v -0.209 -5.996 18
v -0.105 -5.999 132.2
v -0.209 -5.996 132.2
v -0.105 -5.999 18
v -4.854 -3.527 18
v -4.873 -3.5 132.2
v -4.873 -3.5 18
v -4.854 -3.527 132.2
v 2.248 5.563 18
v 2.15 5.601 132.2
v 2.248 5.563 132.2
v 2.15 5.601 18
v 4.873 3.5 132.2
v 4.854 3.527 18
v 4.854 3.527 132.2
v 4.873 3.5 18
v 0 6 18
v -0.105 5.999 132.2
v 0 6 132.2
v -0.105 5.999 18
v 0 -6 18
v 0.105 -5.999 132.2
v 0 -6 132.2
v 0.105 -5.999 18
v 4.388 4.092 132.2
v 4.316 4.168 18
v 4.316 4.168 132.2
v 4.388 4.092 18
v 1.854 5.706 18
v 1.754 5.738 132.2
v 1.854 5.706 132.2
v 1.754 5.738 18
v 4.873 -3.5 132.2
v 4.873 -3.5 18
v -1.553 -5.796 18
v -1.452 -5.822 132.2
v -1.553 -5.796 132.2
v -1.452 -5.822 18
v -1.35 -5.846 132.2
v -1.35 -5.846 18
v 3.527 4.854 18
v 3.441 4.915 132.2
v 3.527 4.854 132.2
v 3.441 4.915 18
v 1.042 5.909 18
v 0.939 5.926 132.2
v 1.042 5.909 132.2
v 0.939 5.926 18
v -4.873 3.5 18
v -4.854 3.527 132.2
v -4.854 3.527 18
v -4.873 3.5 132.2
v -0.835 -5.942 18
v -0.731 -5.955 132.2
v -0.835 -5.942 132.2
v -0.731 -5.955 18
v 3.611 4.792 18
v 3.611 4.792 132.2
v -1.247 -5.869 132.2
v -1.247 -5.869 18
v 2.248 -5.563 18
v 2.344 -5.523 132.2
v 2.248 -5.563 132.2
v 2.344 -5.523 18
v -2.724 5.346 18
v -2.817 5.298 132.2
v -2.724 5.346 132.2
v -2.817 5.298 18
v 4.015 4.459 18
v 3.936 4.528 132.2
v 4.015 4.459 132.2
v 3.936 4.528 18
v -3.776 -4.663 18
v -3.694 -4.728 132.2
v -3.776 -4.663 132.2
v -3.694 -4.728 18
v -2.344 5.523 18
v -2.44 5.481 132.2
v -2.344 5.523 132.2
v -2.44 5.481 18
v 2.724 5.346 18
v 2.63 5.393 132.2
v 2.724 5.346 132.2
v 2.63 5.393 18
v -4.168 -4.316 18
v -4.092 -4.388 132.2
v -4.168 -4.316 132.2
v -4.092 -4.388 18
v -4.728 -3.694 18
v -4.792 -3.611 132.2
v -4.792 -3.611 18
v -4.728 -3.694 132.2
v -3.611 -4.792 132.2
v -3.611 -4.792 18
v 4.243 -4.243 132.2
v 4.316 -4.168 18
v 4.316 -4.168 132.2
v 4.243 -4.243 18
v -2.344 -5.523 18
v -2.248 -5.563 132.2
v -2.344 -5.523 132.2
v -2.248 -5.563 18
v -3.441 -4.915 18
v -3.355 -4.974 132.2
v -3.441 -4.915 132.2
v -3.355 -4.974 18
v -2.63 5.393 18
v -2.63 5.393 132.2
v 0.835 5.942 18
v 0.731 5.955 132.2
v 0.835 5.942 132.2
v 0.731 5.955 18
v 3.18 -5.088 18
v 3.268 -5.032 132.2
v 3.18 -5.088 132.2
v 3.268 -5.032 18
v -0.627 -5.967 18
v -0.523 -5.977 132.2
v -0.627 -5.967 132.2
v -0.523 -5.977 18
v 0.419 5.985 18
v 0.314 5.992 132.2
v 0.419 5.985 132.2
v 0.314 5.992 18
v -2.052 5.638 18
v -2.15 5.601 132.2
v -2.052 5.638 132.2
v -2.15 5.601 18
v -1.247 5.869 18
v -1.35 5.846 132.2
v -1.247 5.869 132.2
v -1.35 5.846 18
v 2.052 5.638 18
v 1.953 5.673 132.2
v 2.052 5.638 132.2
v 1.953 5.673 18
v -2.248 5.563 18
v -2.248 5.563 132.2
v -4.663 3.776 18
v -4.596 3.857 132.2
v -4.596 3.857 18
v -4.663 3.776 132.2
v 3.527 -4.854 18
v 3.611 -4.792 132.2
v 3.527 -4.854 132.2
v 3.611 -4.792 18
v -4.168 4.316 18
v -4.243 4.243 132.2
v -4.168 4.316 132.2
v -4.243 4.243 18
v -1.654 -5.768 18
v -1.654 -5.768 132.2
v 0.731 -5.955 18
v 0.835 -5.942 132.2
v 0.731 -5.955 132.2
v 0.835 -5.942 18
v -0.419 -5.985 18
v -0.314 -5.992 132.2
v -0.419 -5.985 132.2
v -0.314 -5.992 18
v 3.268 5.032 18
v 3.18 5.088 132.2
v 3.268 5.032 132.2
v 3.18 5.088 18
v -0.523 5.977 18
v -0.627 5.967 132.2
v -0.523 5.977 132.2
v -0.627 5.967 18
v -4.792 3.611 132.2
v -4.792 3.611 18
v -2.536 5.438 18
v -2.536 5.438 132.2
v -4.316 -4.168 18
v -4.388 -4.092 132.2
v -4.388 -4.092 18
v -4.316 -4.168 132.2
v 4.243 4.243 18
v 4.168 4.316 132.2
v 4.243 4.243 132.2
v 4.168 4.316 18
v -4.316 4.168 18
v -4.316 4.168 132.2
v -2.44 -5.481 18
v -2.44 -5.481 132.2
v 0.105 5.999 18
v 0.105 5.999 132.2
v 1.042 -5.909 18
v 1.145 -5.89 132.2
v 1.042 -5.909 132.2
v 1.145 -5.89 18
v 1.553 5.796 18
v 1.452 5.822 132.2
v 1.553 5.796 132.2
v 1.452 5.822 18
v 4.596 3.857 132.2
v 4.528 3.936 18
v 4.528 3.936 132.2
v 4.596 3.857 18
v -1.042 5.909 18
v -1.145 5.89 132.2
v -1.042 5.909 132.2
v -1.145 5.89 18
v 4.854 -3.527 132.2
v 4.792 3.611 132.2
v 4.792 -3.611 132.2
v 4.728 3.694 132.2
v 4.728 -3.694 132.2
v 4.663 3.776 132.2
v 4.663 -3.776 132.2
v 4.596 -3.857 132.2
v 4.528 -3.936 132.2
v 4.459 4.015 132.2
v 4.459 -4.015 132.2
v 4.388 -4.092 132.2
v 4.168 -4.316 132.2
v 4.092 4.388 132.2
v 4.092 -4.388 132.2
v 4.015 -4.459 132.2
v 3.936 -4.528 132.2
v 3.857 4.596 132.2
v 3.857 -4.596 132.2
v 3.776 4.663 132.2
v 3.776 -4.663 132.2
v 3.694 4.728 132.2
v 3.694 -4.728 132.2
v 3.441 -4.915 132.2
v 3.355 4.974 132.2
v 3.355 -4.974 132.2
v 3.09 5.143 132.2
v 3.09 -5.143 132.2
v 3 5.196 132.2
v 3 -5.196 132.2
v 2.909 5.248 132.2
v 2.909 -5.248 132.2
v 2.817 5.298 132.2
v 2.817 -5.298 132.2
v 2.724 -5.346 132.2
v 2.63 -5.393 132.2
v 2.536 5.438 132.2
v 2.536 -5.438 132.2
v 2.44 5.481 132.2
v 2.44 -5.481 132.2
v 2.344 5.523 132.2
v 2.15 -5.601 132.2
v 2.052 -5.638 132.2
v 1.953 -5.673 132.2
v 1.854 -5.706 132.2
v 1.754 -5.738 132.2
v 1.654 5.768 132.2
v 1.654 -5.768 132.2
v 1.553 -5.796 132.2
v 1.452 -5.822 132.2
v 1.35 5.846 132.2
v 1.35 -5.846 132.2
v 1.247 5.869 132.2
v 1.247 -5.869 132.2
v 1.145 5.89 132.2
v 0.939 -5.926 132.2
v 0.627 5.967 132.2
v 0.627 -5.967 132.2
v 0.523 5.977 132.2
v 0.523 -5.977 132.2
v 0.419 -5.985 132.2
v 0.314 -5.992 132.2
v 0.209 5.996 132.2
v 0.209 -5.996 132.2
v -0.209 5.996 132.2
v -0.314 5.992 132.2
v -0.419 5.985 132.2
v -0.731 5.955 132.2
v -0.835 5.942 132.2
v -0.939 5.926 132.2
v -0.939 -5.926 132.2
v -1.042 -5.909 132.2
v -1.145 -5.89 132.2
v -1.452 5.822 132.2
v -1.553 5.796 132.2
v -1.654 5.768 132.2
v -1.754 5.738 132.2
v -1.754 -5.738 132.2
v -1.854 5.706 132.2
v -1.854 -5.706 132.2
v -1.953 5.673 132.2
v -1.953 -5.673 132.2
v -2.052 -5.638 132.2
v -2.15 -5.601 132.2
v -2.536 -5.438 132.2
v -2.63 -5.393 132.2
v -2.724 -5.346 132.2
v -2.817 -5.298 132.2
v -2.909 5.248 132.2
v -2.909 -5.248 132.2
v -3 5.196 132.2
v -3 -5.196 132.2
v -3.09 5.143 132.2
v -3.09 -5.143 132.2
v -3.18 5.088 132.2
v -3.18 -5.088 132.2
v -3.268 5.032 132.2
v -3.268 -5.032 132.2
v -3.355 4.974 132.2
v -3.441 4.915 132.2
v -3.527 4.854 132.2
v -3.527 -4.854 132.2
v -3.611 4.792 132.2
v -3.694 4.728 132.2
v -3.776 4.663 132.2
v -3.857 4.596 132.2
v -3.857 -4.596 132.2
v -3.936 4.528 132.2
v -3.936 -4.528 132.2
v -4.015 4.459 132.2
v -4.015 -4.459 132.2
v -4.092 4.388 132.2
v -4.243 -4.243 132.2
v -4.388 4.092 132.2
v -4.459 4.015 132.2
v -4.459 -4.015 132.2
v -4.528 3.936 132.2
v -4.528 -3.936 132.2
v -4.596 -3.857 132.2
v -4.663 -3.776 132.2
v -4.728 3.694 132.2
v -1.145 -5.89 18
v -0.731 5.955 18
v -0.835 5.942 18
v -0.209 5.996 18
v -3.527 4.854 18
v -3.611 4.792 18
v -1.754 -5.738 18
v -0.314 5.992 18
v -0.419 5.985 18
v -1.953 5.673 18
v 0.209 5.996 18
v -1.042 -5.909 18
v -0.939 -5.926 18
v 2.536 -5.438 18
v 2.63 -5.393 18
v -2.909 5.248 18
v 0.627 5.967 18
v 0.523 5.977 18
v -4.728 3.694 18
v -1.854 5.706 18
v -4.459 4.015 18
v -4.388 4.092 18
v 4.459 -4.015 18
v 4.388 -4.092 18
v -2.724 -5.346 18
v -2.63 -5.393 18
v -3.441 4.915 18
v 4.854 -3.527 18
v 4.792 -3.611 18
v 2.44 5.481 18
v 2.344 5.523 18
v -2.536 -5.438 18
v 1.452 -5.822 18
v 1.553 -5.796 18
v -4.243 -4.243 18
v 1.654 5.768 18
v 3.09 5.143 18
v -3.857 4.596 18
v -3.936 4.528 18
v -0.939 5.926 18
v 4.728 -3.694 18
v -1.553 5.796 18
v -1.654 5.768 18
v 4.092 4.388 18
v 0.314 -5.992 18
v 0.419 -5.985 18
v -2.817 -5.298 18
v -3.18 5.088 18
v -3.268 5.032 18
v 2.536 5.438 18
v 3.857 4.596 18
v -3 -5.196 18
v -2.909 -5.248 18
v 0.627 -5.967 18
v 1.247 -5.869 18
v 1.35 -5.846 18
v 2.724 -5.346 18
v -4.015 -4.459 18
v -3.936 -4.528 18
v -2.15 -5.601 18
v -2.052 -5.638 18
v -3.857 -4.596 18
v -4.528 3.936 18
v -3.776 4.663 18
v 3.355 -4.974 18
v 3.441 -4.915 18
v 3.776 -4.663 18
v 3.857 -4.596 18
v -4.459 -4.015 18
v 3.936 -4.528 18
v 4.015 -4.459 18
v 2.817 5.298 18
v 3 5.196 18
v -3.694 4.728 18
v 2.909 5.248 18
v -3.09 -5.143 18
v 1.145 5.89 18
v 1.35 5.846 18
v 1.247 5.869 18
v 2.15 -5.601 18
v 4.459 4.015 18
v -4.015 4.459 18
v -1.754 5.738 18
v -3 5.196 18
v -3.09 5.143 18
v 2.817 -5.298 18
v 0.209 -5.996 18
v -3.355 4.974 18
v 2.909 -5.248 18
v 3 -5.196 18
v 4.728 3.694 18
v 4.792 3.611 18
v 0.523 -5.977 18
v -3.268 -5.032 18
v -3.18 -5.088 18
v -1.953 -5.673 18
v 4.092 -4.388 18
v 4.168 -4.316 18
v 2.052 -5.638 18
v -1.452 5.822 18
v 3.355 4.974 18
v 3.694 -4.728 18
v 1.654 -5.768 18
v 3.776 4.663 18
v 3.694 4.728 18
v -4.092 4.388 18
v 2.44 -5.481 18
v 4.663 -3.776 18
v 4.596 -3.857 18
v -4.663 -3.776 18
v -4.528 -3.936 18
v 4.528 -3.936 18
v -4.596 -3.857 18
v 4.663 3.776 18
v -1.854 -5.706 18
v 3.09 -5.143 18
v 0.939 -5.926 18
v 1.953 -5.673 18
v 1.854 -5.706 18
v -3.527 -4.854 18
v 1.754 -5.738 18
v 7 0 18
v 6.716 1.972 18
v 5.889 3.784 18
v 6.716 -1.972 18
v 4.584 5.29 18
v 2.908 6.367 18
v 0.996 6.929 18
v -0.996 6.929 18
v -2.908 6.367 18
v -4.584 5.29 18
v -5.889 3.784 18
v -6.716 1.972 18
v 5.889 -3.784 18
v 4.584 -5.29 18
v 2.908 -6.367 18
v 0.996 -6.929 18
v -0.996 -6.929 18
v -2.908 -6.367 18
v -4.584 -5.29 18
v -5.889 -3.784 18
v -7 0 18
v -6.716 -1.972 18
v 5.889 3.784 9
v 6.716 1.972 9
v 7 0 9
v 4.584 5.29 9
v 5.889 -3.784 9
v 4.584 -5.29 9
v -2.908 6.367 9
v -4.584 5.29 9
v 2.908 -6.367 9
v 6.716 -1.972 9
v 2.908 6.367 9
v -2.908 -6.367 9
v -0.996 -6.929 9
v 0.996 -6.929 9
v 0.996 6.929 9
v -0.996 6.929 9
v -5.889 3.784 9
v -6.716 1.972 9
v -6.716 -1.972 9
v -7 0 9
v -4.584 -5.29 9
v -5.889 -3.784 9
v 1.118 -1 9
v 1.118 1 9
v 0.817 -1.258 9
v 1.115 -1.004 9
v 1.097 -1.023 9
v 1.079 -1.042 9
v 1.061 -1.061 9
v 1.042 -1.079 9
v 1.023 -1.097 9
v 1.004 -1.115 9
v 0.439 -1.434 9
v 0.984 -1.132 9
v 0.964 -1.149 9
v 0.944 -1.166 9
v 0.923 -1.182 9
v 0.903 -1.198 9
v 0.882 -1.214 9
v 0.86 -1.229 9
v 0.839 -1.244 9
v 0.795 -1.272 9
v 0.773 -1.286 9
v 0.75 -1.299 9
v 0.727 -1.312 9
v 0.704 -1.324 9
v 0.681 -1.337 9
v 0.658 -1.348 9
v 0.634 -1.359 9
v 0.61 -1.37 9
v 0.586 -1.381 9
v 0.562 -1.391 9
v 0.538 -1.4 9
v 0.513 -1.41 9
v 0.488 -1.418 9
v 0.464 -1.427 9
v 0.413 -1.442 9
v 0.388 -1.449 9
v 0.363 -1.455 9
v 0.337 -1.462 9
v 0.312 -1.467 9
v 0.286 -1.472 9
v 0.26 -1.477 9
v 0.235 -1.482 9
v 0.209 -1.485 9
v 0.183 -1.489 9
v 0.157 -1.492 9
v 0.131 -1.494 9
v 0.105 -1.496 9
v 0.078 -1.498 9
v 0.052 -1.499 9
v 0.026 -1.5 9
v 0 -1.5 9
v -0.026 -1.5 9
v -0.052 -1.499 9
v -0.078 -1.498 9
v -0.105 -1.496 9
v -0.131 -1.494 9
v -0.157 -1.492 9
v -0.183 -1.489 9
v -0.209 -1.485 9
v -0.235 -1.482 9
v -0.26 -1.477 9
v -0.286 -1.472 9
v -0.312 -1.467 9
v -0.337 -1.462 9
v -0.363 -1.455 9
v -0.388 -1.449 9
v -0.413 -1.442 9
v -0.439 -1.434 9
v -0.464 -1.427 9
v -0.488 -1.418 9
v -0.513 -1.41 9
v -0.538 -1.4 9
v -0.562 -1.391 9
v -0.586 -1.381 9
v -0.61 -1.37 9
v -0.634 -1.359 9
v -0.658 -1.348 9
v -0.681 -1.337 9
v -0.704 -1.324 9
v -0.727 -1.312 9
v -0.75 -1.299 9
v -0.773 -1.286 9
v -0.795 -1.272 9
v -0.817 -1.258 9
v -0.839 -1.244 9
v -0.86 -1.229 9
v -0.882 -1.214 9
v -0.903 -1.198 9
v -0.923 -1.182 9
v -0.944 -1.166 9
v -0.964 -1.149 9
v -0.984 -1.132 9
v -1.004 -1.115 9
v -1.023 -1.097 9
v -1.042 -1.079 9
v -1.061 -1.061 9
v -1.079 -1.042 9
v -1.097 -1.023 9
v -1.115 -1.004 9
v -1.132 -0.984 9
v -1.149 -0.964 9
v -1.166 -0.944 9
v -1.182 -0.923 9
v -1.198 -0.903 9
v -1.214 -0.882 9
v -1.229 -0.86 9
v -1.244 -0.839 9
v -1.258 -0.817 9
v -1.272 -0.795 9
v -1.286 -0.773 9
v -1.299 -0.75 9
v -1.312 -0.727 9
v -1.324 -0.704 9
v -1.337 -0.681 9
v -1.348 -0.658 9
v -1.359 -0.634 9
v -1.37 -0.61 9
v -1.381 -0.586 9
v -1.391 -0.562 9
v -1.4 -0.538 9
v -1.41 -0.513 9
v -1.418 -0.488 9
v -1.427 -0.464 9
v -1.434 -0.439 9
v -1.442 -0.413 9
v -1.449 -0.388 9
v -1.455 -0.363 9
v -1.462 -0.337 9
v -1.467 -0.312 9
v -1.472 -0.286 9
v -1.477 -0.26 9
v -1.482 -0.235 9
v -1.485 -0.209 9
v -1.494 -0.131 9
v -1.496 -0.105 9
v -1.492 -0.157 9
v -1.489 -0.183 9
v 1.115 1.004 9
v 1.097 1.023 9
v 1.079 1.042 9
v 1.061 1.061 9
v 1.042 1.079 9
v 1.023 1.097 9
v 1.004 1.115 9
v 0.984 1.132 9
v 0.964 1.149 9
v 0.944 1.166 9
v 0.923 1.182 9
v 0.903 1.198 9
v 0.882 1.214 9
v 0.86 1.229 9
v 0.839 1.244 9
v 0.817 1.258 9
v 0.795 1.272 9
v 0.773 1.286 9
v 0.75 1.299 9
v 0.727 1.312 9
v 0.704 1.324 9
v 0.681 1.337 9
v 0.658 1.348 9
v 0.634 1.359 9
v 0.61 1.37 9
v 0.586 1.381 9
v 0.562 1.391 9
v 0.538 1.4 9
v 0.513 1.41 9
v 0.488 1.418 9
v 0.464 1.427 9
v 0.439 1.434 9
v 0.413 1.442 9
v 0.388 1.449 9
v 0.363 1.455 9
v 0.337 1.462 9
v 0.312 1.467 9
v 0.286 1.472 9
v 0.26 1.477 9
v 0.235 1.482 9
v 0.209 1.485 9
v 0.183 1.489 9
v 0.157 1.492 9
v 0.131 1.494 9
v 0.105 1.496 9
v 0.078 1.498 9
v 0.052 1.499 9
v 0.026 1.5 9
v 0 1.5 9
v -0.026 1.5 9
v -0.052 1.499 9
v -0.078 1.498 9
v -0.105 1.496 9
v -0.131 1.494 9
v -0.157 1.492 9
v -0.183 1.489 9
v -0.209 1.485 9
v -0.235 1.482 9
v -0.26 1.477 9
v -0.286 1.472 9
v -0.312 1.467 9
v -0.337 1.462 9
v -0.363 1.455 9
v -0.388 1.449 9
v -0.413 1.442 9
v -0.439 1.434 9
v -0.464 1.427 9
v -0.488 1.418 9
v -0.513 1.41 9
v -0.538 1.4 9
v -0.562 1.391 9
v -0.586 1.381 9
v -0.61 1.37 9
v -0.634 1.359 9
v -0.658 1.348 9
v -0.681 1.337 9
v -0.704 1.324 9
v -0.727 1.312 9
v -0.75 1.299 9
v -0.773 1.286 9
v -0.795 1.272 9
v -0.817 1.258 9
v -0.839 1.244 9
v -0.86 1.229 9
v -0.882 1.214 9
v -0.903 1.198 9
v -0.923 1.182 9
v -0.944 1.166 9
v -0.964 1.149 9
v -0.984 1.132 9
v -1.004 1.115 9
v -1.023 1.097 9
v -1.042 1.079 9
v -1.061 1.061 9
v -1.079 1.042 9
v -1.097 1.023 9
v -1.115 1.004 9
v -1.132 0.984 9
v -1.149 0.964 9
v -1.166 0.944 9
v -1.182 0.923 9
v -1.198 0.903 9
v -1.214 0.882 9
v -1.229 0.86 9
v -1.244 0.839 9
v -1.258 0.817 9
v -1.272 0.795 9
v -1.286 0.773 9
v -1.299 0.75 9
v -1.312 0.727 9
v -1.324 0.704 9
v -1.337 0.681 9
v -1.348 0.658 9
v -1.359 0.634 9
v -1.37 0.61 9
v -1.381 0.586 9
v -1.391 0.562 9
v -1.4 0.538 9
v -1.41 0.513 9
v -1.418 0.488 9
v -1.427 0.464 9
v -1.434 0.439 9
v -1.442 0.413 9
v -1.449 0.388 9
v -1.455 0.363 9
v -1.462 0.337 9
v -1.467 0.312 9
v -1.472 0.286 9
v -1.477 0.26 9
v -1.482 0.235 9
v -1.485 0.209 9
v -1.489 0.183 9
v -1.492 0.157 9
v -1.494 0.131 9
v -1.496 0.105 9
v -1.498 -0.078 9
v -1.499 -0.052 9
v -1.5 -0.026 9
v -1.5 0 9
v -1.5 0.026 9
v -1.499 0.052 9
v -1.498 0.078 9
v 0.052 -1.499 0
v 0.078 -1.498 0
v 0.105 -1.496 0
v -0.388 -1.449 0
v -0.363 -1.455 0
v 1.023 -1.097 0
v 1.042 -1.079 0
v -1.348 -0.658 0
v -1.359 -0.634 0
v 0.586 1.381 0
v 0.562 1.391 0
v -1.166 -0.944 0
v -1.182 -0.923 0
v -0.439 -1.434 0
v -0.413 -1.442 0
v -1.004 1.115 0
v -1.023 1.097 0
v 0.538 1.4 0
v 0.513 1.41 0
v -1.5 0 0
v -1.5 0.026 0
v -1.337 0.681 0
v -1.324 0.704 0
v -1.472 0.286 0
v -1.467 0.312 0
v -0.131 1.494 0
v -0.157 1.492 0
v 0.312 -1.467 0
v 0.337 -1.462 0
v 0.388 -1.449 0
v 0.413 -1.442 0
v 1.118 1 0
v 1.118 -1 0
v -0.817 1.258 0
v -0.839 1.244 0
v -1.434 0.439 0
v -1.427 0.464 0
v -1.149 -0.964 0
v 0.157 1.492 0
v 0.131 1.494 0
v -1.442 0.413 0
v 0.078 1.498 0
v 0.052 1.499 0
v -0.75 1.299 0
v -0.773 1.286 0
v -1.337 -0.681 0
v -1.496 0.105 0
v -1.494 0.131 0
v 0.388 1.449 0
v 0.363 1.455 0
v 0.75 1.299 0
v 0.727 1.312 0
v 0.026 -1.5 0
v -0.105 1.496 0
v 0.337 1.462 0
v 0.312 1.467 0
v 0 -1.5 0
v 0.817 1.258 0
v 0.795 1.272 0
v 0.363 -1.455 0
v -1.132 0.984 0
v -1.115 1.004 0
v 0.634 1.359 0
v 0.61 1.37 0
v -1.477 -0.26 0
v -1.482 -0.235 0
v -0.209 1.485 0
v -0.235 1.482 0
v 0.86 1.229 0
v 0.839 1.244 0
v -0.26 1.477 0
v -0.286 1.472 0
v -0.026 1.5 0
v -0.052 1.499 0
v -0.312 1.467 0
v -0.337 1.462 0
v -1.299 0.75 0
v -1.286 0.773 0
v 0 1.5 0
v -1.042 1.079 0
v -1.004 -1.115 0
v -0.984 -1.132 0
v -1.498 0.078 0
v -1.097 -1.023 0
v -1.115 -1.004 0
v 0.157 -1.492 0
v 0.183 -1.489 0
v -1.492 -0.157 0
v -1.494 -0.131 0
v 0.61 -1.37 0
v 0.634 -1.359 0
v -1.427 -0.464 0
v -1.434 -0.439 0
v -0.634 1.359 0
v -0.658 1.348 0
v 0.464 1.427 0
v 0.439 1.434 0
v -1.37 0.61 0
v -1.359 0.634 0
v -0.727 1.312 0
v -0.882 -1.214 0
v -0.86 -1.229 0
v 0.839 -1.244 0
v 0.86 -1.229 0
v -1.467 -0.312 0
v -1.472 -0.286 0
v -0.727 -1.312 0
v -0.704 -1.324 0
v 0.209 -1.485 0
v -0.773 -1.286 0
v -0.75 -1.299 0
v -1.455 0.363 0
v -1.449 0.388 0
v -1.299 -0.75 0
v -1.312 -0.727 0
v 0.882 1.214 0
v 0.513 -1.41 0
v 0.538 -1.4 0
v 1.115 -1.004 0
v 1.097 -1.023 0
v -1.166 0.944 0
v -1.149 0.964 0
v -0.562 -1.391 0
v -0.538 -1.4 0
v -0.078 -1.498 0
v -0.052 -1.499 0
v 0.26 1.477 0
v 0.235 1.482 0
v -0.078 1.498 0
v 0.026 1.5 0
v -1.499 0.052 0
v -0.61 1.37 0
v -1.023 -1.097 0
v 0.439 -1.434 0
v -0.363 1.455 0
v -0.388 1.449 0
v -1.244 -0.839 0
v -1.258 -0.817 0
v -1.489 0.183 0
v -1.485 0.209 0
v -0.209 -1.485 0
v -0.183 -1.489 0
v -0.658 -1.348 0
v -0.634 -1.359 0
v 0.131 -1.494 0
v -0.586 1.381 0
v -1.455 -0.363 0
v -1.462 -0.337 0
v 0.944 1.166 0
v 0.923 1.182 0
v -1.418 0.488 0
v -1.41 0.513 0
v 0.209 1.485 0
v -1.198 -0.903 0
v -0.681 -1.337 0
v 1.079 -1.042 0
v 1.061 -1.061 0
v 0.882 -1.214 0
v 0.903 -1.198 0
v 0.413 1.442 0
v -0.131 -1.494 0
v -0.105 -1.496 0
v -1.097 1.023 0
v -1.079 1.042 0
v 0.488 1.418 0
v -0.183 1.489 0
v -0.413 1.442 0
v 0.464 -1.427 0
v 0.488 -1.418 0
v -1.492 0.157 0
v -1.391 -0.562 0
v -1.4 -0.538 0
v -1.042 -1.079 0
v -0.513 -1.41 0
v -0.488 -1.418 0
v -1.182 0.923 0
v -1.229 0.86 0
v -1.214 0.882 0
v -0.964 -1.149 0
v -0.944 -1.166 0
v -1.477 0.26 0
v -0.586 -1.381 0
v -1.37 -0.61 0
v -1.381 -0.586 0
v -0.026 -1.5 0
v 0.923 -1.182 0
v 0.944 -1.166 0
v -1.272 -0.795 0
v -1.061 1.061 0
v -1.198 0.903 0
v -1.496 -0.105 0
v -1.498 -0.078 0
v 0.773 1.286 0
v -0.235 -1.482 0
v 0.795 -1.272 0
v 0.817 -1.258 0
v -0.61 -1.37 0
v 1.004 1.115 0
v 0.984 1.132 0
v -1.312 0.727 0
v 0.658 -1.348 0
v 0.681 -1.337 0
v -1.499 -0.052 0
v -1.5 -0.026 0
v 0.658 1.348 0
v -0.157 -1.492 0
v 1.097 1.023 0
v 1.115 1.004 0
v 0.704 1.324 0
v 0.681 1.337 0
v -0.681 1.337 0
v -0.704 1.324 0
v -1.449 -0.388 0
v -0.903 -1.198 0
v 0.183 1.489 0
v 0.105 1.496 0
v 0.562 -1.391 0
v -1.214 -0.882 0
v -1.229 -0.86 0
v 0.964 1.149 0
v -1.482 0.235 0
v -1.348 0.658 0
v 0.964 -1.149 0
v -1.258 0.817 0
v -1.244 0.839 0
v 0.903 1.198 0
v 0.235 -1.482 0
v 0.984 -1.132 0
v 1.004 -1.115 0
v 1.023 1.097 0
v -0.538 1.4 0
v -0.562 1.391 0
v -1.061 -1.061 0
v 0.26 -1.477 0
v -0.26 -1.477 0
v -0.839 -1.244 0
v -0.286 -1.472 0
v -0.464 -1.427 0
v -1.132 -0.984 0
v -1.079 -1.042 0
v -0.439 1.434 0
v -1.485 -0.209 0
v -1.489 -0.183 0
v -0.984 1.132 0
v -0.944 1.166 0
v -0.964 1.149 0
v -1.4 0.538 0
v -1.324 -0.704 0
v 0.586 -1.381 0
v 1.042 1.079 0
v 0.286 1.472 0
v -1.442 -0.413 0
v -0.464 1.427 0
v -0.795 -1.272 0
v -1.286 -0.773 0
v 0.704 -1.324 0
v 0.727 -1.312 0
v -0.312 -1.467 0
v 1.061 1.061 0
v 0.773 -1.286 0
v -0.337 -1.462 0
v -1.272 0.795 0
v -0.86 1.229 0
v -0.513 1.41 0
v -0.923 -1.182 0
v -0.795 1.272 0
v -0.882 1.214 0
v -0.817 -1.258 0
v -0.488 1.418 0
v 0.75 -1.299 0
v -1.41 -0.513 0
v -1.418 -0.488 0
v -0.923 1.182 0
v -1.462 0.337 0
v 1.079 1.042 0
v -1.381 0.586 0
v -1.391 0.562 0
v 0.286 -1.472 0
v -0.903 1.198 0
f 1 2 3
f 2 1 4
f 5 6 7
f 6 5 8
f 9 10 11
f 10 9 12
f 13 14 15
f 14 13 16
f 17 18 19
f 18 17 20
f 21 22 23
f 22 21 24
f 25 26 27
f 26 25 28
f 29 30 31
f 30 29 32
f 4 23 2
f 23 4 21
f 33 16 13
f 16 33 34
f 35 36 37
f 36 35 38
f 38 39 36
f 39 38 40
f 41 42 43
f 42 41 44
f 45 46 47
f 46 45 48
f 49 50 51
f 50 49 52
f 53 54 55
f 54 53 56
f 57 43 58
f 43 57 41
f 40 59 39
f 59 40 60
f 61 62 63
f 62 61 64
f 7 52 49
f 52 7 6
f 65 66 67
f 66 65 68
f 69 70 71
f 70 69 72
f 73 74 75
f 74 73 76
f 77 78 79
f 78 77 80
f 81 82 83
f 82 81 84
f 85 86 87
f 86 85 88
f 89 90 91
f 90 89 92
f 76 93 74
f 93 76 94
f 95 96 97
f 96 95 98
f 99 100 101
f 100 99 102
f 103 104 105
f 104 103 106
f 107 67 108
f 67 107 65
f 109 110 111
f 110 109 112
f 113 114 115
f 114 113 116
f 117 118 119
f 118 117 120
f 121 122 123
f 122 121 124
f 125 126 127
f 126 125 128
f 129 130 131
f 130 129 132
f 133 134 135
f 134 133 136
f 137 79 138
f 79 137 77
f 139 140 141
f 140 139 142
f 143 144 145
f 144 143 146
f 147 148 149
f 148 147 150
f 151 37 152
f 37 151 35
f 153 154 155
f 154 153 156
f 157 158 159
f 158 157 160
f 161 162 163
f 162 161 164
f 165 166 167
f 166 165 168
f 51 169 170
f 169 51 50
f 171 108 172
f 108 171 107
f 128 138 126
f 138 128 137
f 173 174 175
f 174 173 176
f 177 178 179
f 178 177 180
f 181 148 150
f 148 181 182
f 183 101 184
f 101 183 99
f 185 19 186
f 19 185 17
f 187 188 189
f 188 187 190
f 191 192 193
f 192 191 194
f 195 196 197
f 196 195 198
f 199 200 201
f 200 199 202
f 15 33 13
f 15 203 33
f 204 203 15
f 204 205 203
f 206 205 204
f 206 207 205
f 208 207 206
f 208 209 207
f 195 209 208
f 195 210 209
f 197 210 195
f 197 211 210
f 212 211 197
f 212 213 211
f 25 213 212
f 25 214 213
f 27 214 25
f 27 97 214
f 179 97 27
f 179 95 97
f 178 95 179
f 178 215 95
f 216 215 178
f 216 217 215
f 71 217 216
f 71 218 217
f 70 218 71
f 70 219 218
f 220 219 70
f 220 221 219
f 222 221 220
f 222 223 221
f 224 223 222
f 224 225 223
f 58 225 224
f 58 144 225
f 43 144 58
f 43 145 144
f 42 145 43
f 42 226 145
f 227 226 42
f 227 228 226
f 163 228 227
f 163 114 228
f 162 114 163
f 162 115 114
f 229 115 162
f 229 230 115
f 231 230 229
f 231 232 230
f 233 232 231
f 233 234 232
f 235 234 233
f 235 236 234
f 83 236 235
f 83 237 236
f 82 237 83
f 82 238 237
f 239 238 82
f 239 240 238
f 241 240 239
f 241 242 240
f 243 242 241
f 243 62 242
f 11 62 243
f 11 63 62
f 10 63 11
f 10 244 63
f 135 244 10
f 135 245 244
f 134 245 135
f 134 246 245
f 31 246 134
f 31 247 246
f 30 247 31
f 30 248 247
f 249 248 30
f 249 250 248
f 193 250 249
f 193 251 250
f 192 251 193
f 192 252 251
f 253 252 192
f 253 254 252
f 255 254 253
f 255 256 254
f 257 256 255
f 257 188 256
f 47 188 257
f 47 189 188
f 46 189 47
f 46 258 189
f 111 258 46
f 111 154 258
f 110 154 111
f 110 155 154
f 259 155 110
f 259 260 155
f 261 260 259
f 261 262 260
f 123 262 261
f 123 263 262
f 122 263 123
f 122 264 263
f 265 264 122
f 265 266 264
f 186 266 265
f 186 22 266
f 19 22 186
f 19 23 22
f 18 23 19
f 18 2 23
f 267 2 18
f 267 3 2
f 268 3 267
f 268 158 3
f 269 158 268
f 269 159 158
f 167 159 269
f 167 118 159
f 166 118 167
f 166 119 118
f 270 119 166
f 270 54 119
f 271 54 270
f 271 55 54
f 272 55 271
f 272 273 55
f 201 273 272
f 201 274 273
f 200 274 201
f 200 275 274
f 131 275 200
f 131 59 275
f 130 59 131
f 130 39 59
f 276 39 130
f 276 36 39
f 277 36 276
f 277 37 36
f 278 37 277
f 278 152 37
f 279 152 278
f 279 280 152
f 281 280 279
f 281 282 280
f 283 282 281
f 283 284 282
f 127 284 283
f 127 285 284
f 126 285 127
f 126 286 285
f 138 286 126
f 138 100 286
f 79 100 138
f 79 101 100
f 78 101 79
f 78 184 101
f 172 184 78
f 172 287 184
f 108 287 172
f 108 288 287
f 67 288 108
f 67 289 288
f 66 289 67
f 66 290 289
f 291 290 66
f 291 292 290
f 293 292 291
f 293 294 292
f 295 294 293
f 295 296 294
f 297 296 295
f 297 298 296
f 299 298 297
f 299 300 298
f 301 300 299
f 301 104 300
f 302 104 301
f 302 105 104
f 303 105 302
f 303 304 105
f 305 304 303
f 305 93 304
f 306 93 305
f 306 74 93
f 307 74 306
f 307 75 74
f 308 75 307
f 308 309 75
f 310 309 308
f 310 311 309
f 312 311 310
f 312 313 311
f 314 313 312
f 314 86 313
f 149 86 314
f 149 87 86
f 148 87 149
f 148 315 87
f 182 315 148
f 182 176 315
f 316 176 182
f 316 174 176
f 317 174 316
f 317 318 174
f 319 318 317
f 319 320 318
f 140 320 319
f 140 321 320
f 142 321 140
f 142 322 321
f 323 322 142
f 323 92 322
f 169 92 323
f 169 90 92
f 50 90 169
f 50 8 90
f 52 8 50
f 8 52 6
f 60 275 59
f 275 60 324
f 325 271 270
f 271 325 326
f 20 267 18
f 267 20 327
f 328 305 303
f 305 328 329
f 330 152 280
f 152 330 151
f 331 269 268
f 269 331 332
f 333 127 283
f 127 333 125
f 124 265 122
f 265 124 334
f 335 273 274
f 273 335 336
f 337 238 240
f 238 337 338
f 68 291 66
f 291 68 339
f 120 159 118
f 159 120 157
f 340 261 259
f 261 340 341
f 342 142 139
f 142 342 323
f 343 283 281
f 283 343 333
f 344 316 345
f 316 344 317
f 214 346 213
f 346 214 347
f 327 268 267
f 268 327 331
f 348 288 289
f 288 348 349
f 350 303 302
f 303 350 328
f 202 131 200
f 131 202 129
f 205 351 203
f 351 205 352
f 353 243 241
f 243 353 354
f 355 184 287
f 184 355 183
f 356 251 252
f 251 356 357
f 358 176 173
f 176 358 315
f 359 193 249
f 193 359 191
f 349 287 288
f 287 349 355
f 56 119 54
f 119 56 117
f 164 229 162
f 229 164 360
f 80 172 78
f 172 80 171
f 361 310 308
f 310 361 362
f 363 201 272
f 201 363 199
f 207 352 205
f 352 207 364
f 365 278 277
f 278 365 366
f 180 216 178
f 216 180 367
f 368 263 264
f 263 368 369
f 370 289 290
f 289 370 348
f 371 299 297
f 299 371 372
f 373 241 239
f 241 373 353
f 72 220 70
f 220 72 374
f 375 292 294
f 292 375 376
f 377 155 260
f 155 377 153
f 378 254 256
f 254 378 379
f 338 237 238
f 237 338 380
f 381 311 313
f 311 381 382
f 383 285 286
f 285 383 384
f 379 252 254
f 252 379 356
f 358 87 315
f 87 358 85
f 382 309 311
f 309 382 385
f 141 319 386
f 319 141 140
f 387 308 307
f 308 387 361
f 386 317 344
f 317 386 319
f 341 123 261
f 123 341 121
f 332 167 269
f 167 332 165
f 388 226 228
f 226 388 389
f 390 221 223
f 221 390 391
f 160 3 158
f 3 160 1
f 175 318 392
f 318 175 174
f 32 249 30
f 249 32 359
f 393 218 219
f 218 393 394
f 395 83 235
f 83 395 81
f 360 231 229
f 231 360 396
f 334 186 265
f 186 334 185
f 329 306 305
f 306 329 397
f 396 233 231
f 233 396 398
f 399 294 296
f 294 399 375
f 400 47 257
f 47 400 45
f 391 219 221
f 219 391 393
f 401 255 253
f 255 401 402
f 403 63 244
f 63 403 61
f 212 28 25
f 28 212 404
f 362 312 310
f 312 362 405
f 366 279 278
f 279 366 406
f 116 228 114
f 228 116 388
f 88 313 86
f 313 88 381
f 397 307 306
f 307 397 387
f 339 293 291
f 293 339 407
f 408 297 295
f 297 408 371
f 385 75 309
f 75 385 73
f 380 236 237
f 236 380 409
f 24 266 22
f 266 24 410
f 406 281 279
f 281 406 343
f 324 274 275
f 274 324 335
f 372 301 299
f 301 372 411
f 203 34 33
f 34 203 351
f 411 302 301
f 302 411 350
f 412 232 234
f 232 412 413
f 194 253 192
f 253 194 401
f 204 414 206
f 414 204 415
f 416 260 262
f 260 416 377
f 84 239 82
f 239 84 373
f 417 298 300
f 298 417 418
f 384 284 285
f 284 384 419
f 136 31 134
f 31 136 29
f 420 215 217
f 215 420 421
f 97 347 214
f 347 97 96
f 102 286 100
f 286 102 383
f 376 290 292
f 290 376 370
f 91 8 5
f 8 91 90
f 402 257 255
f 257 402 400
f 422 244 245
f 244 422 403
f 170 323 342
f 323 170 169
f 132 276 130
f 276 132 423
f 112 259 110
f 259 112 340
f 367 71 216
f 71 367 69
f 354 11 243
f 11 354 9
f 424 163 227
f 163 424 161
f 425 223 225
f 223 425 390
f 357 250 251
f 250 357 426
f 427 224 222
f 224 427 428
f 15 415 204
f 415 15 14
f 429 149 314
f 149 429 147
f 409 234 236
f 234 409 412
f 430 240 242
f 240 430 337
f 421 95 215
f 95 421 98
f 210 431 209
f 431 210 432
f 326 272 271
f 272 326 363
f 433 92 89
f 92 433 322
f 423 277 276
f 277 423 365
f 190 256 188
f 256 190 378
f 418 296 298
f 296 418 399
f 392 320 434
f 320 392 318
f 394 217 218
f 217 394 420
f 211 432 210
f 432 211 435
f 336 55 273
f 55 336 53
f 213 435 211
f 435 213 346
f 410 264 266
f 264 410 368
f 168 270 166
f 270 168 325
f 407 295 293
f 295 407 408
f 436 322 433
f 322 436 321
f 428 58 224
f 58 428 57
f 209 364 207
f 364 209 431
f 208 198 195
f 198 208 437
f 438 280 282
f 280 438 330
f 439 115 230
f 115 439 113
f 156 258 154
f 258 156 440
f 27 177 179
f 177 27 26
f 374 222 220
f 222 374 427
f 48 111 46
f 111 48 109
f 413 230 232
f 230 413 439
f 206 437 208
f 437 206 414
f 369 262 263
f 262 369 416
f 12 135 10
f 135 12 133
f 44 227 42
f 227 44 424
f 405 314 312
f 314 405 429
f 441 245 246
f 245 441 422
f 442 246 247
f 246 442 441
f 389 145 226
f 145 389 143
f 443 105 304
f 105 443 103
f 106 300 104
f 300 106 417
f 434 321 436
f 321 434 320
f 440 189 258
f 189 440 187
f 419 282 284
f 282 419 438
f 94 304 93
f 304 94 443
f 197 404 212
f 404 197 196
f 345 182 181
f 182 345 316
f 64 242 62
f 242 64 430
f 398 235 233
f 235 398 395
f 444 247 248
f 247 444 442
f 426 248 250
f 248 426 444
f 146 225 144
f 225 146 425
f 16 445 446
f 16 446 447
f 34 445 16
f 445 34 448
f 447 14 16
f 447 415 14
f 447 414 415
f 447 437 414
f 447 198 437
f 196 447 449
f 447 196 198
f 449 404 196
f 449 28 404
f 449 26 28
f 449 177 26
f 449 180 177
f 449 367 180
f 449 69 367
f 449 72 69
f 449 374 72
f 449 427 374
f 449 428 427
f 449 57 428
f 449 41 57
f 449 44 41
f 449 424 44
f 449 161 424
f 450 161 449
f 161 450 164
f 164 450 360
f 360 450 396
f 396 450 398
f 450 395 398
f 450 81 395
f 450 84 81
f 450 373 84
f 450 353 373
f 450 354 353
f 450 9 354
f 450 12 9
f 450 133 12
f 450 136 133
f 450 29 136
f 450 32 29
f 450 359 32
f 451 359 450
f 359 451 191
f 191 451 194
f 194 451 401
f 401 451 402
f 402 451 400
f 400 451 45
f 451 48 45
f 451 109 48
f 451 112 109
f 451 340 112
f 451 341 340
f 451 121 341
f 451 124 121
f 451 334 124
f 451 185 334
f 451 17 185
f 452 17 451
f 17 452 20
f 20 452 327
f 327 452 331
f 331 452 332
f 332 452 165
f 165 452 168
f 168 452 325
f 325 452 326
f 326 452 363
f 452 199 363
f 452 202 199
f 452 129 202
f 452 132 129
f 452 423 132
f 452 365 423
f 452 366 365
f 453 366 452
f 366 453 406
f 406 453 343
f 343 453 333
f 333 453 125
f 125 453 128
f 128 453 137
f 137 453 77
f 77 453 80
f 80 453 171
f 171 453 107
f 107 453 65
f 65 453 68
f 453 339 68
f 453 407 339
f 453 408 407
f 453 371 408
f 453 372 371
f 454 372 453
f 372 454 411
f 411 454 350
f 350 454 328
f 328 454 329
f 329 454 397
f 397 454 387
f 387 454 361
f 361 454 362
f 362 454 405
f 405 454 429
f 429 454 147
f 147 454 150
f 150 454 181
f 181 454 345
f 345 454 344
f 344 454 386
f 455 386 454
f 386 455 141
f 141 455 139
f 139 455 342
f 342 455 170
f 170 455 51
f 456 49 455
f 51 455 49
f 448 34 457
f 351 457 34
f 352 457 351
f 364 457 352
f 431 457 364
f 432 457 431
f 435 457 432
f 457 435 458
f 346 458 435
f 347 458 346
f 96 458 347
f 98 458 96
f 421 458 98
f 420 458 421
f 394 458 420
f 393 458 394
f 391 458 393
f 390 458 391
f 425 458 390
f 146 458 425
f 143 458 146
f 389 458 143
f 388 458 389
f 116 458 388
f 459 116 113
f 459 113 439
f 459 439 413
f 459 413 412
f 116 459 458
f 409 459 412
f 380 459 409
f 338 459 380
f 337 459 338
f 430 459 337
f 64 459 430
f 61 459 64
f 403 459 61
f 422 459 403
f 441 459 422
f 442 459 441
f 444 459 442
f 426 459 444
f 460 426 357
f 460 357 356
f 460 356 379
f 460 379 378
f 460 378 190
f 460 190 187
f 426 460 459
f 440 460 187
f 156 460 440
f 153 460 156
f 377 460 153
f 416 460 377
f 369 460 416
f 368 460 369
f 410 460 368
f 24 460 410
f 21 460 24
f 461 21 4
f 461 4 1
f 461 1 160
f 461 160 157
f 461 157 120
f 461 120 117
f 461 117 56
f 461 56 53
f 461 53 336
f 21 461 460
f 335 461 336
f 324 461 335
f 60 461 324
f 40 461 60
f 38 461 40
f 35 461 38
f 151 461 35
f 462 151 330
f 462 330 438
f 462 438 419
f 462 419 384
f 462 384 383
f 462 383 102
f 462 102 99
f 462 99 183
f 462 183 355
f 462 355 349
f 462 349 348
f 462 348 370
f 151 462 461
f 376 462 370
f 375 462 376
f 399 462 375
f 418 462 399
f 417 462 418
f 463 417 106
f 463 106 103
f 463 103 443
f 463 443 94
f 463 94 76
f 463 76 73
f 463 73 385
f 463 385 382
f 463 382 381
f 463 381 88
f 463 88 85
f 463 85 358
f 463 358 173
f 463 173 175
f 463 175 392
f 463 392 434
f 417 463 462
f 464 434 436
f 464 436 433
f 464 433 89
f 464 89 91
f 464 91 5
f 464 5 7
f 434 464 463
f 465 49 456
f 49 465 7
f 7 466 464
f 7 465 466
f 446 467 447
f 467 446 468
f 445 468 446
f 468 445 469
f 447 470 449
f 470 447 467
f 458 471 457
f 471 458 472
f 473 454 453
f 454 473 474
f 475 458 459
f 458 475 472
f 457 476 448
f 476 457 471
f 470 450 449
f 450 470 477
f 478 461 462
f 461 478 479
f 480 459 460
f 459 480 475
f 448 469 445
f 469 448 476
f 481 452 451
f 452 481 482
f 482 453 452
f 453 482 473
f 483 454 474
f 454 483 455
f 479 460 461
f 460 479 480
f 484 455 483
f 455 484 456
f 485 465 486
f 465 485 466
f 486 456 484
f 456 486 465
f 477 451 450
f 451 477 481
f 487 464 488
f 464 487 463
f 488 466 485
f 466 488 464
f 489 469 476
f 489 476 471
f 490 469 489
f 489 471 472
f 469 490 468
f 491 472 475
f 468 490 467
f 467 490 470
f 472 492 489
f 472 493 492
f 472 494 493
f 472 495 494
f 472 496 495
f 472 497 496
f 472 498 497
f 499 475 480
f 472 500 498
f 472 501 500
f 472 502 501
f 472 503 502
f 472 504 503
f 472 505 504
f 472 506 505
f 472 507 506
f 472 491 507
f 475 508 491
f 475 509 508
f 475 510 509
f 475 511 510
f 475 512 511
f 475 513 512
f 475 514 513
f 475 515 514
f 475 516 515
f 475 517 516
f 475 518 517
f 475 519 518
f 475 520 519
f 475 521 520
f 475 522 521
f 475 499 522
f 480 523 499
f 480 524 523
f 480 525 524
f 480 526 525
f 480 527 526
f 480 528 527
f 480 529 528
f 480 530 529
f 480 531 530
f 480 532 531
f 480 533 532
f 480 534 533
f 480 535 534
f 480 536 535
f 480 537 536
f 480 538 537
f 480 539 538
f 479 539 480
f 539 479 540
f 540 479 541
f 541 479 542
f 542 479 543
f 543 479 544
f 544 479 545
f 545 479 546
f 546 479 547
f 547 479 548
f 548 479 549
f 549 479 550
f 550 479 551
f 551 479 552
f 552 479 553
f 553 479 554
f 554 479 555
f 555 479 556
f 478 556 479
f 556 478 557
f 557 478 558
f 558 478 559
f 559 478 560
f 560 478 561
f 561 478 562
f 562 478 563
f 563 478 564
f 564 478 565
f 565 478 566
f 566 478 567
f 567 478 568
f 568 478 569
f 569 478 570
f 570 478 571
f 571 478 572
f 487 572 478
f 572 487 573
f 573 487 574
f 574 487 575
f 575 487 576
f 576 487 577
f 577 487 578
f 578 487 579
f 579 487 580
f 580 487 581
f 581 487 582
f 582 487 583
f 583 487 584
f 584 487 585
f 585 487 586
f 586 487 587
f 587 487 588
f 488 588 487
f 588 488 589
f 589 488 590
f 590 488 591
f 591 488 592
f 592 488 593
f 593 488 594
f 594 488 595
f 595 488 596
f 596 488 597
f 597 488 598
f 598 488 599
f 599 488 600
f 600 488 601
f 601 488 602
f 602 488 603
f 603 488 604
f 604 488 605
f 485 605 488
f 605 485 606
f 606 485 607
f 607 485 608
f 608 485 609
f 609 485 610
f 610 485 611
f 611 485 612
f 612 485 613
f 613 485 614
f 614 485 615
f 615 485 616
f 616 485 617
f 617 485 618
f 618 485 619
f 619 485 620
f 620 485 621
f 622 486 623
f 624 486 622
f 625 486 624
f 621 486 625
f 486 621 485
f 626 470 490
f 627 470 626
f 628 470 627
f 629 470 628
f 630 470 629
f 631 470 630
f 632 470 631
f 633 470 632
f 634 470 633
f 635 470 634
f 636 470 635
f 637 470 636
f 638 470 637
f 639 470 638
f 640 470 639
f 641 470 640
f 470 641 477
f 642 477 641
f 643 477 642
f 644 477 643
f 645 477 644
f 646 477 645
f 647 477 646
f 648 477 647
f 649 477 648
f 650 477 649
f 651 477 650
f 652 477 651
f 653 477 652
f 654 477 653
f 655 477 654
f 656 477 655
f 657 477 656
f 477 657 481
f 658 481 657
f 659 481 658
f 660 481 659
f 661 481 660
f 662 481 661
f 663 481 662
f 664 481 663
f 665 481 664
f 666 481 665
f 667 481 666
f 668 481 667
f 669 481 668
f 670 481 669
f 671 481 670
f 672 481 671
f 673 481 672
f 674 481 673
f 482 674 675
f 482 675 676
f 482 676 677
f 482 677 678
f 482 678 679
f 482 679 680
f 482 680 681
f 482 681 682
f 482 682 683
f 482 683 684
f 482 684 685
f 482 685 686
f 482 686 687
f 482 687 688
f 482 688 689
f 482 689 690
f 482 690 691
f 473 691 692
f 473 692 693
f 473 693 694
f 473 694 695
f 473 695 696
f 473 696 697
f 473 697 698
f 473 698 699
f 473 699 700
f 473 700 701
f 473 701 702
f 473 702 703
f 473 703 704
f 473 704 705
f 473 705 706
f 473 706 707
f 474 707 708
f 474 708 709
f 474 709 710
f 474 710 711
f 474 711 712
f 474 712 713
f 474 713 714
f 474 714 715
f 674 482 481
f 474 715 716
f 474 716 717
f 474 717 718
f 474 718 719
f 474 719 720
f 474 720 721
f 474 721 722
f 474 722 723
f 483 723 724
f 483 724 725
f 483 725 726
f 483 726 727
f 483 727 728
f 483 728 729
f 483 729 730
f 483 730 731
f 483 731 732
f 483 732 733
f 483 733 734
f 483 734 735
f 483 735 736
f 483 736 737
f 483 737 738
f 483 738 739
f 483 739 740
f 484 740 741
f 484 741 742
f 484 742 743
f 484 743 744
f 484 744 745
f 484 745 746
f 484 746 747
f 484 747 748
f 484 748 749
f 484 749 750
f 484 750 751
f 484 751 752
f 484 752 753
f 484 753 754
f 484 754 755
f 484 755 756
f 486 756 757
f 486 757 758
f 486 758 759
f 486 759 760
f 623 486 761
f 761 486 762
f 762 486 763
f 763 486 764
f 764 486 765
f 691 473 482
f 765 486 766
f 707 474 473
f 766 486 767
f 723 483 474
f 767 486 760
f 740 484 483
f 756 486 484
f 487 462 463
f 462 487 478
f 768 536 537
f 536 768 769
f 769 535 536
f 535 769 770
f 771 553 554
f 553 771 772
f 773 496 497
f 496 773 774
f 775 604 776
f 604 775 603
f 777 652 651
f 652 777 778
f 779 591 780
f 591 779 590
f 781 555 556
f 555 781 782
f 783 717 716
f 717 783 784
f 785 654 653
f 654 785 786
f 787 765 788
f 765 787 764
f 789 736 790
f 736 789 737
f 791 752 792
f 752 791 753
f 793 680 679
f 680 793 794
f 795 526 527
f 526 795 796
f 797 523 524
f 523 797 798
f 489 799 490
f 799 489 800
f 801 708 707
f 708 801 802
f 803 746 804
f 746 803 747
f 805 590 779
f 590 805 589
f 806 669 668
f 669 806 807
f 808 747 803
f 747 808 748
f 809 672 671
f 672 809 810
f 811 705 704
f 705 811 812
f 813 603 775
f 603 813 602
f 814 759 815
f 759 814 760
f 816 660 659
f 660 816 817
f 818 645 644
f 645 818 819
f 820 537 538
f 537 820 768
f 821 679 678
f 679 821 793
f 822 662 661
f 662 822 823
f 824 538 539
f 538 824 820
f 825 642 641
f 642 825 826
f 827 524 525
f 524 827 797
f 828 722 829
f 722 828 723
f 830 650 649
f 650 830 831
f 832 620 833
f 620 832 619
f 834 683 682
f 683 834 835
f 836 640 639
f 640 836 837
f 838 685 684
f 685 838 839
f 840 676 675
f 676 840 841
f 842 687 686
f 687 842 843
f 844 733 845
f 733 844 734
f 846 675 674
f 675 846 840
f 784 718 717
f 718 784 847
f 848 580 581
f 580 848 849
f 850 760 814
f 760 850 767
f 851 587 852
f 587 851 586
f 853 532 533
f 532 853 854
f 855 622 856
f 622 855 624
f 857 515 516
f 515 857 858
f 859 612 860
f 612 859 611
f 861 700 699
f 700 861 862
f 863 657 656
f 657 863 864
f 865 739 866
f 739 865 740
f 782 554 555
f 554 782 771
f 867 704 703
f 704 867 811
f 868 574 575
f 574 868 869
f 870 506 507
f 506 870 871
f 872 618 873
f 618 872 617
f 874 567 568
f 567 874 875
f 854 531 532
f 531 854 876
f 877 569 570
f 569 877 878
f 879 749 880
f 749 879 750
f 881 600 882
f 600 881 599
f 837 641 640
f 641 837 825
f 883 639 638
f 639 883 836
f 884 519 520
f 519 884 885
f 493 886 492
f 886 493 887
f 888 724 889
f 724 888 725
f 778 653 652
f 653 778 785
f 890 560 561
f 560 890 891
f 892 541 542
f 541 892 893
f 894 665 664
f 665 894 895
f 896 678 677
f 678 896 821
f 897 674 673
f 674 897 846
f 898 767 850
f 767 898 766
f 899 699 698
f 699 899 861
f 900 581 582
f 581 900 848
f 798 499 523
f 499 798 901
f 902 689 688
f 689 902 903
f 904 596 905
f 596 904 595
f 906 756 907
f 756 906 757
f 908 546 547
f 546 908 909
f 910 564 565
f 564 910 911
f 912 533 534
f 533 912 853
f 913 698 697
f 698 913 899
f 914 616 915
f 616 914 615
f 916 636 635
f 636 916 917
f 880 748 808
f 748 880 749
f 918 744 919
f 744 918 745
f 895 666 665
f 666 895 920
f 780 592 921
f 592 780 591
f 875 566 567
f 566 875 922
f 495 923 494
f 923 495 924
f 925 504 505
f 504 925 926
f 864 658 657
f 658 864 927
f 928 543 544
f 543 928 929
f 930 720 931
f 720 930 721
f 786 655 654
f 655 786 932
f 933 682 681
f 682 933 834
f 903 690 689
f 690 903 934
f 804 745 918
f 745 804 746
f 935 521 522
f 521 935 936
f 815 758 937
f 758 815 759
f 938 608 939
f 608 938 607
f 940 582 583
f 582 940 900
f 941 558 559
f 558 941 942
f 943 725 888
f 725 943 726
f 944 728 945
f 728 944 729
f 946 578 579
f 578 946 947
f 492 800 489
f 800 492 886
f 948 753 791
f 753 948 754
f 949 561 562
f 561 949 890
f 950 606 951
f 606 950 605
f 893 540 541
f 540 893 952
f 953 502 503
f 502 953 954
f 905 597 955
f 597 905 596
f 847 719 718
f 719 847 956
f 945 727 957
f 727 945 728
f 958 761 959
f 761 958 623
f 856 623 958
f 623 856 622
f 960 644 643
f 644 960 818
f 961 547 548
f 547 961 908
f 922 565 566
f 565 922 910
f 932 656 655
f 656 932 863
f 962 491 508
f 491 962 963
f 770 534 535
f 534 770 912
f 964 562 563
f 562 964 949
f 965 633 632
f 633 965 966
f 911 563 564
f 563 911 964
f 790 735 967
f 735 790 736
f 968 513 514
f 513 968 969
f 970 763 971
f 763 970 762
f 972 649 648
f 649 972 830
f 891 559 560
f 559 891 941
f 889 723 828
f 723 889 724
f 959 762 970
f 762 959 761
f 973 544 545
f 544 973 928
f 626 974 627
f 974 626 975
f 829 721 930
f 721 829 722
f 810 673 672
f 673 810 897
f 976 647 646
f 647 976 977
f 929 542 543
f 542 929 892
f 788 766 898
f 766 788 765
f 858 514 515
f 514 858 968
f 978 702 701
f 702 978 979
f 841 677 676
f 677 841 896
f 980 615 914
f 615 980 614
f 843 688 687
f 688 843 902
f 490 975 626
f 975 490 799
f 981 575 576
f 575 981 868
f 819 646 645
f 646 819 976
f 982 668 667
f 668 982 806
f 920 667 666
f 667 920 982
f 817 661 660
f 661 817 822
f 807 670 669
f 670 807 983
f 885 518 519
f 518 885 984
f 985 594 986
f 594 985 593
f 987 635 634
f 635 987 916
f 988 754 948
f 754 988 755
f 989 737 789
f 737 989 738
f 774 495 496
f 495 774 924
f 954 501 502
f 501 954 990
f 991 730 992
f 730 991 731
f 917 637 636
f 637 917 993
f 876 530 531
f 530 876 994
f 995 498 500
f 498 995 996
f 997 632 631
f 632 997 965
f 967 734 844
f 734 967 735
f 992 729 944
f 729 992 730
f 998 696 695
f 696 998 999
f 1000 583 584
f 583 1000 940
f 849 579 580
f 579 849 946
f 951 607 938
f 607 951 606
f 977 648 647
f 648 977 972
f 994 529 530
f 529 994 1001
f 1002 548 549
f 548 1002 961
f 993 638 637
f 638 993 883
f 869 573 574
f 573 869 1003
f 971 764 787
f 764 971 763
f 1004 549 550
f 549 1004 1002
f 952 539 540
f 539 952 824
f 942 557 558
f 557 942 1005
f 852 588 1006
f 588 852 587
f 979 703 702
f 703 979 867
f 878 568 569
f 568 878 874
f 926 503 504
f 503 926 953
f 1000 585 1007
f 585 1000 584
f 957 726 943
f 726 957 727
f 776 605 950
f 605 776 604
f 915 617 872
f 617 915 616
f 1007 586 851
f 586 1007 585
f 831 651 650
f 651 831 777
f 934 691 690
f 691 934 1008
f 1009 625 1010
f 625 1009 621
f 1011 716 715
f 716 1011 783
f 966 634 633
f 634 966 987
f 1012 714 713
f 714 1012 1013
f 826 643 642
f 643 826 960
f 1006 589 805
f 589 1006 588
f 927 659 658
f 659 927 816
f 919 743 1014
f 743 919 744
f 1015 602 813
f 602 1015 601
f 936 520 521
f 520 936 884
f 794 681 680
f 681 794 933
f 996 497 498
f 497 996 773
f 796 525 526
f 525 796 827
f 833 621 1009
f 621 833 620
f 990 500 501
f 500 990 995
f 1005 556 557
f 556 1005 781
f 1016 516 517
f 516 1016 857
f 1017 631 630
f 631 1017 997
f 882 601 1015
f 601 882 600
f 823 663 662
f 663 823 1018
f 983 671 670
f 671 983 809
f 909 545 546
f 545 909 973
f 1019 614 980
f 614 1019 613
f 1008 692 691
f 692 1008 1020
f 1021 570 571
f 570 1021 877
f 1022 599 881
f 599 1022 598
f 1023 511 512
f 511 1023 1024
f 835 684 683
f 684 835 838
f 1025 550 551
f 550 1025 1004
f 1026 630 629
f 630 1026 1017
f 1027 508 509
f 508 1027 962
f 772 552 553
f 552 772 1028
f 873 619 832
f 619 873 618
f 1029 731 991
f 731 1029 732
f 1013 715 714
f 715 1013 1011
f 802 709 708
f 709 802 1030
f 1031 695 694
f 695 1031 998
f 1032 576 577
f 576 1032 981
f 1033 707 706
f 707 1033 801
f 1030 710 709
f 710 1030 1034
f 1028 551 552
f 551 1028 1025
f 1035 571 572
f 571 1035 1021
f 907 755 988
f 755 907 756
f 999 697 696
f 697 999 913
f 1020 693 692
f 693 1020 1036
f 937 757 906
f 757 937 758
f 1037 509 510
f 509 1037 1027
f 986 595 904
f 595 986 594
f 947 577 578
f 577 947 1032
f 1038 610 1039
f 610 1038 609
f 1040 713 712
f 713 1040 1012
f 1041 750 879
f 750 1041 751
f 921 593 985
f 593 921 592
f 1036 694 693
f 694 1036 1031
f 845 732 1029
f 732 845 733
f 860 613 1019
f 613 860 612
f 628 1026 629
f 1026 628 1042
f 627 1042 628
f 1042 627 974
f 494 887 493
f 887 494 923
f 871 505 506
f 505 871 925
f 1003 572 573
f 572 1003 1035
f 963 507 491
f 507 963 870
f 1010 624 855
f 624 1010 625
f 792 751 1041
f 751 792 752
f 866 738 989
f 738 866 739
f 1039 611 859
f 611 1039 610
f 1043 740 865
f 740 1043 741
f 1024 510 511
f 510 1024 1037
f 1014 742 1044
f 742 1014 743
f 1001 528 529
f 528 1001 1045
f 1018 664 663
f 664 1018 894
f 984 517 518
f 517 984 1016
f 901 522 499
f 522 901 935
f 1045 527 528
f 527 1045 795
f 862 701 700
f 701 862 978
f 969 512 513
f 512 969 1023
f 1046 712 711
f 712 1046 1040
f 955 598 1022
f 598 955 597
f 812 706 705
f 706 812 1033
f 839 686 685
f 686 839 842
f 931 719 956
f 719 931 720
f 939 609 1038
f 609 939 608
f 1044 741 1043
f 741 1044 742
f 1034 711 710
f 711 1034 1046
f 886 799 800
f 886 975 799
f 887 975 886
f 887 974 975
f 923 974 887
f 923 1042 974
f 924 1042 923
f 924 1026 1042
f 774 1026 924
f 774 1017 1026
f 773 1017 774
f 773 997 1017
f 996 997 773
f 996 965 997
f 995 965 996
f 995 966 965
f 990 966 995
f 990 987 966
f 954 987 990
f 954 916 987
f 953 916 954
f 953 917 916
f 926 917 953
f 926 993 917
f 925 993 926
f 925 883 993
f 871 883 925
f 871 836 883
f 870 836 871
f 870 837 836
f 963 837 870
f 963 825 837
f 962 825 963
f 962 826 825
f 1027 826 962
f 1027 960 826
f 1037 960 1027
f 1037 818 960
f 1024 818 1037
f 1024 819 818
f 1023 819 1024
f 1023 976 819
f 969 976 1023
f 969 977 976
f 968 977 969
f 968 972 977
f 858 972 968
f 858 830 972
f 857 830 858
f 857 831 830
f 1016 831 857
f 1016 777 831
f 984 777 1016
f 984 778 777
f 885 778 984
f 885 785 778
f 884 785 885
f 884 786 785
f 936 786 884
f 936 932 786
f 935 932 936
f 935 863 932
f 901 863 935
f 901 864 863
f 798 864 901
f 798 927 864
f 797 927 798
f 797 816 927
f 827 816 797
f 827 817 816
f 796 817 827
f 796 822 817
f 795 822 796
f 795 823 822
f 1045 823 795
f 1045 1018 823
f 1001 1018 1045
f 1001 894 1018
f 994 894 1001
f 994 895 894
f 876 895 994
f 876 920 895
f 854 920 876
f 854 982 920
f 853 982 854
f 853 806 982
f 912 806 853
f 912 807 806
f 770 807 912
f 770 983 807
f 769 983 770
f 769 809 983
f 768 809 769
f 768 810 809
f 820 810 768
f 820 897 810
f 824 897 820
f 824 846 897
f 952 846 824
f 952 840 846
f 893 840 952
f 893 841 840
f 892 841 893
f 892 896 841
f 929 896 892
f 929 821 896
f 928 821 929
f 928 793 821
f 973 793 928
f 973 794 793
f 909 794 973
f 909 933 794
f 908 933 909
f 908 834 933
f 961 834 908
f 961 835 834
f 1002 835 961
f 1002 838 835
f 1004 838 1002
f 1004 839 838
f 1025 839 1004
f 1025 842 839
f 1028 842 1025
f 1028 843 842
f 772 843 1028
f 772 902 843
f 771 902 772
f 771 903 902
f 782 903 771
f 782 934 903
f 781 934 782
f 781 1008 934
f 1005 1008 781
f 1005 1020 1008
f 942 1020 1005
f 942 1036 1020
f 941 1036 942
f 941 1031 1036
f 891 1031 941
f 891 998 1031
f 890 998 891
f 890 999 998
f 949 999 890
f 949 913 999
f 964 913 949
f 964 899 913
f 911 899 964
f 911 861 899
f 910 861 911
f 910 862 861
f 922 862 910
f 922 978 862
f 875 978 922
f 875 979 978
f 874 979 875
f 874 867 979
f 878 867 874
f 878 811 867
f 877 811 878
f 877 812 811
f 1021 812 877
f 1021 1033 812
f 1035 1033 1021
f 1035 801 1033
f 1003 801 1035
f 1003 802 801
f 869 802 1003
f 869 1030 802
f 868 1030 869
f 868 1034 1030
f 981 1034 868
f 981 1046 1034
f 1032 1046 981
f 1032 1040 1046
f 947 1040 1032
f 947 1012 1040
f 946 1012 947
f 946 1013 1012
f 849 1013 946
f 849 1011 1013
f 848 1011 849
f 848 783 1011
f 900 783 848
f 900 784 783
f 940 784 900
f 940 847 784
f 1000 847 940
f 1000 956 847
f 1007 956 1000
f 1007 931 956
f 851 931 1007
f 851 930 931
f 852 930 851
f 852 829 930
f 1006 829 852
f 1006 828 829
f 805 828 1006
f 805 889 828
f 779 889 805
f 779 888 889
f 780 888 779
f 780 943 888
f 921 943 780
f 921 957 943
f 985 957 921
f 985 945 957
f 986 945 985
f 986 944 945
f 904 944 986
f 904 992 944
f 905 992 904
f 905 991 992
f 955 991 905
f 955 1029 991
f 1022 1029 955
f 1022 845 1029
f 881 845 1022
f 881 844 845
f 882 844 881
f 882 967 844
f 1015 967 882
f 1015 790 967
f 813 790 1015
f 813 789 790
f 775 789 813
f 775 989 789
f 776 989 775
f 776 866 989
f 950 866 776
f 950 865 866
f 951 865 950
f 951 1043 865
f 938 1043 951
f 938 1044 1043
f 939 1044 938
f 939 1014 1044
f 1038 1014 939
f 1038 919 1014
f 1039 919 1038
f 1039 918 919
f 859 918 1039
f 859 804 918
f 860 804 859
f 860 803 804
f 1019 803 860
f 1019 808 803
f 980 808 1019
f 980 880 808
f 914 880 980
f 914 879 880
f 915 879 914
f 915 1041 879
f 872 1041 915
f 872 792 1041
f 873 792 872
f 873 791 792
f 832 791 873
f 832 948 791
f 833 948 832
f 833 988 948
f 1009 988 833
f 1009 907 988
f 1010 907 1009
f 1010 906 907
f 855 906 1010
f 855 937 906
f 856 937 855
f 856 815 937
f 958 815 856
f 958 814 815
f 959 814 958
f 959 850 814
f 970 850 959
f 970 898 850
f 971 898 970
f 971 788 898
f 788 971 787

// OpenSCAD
/**
 * Module: A dummy mockup of the N20-Motor
 *
 * Author: Karim Aziiev <karim.aziiev@gmail.com>
 * License: GPL-3.0-or-later
 */

include <../parameters.scad>
include <../colors.scad>

use <../wheels/rear_wheel.scad>
use <../lib/shapes3d.scad>

module n20_motor_reductor() {
  cylinder(h=n20_reductor_height, r=n20_reductor_dia / 2, center=false);
}

module n20_motor_shaft() {
  notched_circle(d=n20_shaft_dia,
                 cutout_w=n20_shaft_cutout_w,
                 h=n20_shaft_height,
                 x_cutouts_n=1,
                 y_cutouts_n=0);
}

module n20_motor_can() {
  union() {
    total_end_cap_h = n20_end_cap_h + n20_end_circle_h;
    translate([0, 0, n20_can_height - n20_end_cap_h]) {
      union() {
        difference() {
          color(black_1) {
            notched_circle(h=n20_end_cap_h,
                           d=n20_can_dia,
                           cutout_w=n20_can_cutout_w,
                           x_cutouts_n=2, $fn=360);
            translate([0, 0, n20_end_cap_h]) {
              linear_extrude(height=n20_end_circle_h) {
                circle(d=n20_end_cap_circle_dia, $fn=30);
              }
            }
          }

          translate([0, 0, -total_end_cap_h / 2]) {
            linear_extrude(height=total_end_cap_h + 1) {
              circle(d=n20_end_cap_circle_hole_dia, $fn=30);
            }
          }
        }

        x = 1;
        y = 1.2;

        color("silver") {
          for (pos = [[0, -n20_end_cap_circle_dia + 2, y],
                      [0, n20_end_cap_circle_dia - 2, y]]) {
            translate(pos) {
              rotate([90, 0, 0]) {
                linear_extrude(height=0.4, center=true) {
                  difference() {
                    square(size = [x, y], center = true);
                    translate([0, y * 0.4 / 2, 0]) {
                      square(size = [x * 0.8, y * 0.4], center = true);
                    }
                  }
                }
              }
            }
          }
        }
      }
    }
    color("silver") {
      notched_circle(h=n20_can_height - n20_end_cap_h,
                     d=n20_can_dia,
                     cutout_w=n20_can_cutout_w,
                     x_cutouts_n=2);
    }
  }
}

module n20_motor() {
  translate([0, 0, n20_shaft_height]) {
    union() {
      color(dark_gold_1) {
        n20_motor_reductor();
      }
      translate([0, 0, -n20_reductor_height]) {
        color(metallic_silver_3) {
          n20_motor_shaft();
        }
      }
      translate([0, 0, n20_reductor_height]) {
        n20_motor_can();
      }
    }
  }
}

n20_motor();
